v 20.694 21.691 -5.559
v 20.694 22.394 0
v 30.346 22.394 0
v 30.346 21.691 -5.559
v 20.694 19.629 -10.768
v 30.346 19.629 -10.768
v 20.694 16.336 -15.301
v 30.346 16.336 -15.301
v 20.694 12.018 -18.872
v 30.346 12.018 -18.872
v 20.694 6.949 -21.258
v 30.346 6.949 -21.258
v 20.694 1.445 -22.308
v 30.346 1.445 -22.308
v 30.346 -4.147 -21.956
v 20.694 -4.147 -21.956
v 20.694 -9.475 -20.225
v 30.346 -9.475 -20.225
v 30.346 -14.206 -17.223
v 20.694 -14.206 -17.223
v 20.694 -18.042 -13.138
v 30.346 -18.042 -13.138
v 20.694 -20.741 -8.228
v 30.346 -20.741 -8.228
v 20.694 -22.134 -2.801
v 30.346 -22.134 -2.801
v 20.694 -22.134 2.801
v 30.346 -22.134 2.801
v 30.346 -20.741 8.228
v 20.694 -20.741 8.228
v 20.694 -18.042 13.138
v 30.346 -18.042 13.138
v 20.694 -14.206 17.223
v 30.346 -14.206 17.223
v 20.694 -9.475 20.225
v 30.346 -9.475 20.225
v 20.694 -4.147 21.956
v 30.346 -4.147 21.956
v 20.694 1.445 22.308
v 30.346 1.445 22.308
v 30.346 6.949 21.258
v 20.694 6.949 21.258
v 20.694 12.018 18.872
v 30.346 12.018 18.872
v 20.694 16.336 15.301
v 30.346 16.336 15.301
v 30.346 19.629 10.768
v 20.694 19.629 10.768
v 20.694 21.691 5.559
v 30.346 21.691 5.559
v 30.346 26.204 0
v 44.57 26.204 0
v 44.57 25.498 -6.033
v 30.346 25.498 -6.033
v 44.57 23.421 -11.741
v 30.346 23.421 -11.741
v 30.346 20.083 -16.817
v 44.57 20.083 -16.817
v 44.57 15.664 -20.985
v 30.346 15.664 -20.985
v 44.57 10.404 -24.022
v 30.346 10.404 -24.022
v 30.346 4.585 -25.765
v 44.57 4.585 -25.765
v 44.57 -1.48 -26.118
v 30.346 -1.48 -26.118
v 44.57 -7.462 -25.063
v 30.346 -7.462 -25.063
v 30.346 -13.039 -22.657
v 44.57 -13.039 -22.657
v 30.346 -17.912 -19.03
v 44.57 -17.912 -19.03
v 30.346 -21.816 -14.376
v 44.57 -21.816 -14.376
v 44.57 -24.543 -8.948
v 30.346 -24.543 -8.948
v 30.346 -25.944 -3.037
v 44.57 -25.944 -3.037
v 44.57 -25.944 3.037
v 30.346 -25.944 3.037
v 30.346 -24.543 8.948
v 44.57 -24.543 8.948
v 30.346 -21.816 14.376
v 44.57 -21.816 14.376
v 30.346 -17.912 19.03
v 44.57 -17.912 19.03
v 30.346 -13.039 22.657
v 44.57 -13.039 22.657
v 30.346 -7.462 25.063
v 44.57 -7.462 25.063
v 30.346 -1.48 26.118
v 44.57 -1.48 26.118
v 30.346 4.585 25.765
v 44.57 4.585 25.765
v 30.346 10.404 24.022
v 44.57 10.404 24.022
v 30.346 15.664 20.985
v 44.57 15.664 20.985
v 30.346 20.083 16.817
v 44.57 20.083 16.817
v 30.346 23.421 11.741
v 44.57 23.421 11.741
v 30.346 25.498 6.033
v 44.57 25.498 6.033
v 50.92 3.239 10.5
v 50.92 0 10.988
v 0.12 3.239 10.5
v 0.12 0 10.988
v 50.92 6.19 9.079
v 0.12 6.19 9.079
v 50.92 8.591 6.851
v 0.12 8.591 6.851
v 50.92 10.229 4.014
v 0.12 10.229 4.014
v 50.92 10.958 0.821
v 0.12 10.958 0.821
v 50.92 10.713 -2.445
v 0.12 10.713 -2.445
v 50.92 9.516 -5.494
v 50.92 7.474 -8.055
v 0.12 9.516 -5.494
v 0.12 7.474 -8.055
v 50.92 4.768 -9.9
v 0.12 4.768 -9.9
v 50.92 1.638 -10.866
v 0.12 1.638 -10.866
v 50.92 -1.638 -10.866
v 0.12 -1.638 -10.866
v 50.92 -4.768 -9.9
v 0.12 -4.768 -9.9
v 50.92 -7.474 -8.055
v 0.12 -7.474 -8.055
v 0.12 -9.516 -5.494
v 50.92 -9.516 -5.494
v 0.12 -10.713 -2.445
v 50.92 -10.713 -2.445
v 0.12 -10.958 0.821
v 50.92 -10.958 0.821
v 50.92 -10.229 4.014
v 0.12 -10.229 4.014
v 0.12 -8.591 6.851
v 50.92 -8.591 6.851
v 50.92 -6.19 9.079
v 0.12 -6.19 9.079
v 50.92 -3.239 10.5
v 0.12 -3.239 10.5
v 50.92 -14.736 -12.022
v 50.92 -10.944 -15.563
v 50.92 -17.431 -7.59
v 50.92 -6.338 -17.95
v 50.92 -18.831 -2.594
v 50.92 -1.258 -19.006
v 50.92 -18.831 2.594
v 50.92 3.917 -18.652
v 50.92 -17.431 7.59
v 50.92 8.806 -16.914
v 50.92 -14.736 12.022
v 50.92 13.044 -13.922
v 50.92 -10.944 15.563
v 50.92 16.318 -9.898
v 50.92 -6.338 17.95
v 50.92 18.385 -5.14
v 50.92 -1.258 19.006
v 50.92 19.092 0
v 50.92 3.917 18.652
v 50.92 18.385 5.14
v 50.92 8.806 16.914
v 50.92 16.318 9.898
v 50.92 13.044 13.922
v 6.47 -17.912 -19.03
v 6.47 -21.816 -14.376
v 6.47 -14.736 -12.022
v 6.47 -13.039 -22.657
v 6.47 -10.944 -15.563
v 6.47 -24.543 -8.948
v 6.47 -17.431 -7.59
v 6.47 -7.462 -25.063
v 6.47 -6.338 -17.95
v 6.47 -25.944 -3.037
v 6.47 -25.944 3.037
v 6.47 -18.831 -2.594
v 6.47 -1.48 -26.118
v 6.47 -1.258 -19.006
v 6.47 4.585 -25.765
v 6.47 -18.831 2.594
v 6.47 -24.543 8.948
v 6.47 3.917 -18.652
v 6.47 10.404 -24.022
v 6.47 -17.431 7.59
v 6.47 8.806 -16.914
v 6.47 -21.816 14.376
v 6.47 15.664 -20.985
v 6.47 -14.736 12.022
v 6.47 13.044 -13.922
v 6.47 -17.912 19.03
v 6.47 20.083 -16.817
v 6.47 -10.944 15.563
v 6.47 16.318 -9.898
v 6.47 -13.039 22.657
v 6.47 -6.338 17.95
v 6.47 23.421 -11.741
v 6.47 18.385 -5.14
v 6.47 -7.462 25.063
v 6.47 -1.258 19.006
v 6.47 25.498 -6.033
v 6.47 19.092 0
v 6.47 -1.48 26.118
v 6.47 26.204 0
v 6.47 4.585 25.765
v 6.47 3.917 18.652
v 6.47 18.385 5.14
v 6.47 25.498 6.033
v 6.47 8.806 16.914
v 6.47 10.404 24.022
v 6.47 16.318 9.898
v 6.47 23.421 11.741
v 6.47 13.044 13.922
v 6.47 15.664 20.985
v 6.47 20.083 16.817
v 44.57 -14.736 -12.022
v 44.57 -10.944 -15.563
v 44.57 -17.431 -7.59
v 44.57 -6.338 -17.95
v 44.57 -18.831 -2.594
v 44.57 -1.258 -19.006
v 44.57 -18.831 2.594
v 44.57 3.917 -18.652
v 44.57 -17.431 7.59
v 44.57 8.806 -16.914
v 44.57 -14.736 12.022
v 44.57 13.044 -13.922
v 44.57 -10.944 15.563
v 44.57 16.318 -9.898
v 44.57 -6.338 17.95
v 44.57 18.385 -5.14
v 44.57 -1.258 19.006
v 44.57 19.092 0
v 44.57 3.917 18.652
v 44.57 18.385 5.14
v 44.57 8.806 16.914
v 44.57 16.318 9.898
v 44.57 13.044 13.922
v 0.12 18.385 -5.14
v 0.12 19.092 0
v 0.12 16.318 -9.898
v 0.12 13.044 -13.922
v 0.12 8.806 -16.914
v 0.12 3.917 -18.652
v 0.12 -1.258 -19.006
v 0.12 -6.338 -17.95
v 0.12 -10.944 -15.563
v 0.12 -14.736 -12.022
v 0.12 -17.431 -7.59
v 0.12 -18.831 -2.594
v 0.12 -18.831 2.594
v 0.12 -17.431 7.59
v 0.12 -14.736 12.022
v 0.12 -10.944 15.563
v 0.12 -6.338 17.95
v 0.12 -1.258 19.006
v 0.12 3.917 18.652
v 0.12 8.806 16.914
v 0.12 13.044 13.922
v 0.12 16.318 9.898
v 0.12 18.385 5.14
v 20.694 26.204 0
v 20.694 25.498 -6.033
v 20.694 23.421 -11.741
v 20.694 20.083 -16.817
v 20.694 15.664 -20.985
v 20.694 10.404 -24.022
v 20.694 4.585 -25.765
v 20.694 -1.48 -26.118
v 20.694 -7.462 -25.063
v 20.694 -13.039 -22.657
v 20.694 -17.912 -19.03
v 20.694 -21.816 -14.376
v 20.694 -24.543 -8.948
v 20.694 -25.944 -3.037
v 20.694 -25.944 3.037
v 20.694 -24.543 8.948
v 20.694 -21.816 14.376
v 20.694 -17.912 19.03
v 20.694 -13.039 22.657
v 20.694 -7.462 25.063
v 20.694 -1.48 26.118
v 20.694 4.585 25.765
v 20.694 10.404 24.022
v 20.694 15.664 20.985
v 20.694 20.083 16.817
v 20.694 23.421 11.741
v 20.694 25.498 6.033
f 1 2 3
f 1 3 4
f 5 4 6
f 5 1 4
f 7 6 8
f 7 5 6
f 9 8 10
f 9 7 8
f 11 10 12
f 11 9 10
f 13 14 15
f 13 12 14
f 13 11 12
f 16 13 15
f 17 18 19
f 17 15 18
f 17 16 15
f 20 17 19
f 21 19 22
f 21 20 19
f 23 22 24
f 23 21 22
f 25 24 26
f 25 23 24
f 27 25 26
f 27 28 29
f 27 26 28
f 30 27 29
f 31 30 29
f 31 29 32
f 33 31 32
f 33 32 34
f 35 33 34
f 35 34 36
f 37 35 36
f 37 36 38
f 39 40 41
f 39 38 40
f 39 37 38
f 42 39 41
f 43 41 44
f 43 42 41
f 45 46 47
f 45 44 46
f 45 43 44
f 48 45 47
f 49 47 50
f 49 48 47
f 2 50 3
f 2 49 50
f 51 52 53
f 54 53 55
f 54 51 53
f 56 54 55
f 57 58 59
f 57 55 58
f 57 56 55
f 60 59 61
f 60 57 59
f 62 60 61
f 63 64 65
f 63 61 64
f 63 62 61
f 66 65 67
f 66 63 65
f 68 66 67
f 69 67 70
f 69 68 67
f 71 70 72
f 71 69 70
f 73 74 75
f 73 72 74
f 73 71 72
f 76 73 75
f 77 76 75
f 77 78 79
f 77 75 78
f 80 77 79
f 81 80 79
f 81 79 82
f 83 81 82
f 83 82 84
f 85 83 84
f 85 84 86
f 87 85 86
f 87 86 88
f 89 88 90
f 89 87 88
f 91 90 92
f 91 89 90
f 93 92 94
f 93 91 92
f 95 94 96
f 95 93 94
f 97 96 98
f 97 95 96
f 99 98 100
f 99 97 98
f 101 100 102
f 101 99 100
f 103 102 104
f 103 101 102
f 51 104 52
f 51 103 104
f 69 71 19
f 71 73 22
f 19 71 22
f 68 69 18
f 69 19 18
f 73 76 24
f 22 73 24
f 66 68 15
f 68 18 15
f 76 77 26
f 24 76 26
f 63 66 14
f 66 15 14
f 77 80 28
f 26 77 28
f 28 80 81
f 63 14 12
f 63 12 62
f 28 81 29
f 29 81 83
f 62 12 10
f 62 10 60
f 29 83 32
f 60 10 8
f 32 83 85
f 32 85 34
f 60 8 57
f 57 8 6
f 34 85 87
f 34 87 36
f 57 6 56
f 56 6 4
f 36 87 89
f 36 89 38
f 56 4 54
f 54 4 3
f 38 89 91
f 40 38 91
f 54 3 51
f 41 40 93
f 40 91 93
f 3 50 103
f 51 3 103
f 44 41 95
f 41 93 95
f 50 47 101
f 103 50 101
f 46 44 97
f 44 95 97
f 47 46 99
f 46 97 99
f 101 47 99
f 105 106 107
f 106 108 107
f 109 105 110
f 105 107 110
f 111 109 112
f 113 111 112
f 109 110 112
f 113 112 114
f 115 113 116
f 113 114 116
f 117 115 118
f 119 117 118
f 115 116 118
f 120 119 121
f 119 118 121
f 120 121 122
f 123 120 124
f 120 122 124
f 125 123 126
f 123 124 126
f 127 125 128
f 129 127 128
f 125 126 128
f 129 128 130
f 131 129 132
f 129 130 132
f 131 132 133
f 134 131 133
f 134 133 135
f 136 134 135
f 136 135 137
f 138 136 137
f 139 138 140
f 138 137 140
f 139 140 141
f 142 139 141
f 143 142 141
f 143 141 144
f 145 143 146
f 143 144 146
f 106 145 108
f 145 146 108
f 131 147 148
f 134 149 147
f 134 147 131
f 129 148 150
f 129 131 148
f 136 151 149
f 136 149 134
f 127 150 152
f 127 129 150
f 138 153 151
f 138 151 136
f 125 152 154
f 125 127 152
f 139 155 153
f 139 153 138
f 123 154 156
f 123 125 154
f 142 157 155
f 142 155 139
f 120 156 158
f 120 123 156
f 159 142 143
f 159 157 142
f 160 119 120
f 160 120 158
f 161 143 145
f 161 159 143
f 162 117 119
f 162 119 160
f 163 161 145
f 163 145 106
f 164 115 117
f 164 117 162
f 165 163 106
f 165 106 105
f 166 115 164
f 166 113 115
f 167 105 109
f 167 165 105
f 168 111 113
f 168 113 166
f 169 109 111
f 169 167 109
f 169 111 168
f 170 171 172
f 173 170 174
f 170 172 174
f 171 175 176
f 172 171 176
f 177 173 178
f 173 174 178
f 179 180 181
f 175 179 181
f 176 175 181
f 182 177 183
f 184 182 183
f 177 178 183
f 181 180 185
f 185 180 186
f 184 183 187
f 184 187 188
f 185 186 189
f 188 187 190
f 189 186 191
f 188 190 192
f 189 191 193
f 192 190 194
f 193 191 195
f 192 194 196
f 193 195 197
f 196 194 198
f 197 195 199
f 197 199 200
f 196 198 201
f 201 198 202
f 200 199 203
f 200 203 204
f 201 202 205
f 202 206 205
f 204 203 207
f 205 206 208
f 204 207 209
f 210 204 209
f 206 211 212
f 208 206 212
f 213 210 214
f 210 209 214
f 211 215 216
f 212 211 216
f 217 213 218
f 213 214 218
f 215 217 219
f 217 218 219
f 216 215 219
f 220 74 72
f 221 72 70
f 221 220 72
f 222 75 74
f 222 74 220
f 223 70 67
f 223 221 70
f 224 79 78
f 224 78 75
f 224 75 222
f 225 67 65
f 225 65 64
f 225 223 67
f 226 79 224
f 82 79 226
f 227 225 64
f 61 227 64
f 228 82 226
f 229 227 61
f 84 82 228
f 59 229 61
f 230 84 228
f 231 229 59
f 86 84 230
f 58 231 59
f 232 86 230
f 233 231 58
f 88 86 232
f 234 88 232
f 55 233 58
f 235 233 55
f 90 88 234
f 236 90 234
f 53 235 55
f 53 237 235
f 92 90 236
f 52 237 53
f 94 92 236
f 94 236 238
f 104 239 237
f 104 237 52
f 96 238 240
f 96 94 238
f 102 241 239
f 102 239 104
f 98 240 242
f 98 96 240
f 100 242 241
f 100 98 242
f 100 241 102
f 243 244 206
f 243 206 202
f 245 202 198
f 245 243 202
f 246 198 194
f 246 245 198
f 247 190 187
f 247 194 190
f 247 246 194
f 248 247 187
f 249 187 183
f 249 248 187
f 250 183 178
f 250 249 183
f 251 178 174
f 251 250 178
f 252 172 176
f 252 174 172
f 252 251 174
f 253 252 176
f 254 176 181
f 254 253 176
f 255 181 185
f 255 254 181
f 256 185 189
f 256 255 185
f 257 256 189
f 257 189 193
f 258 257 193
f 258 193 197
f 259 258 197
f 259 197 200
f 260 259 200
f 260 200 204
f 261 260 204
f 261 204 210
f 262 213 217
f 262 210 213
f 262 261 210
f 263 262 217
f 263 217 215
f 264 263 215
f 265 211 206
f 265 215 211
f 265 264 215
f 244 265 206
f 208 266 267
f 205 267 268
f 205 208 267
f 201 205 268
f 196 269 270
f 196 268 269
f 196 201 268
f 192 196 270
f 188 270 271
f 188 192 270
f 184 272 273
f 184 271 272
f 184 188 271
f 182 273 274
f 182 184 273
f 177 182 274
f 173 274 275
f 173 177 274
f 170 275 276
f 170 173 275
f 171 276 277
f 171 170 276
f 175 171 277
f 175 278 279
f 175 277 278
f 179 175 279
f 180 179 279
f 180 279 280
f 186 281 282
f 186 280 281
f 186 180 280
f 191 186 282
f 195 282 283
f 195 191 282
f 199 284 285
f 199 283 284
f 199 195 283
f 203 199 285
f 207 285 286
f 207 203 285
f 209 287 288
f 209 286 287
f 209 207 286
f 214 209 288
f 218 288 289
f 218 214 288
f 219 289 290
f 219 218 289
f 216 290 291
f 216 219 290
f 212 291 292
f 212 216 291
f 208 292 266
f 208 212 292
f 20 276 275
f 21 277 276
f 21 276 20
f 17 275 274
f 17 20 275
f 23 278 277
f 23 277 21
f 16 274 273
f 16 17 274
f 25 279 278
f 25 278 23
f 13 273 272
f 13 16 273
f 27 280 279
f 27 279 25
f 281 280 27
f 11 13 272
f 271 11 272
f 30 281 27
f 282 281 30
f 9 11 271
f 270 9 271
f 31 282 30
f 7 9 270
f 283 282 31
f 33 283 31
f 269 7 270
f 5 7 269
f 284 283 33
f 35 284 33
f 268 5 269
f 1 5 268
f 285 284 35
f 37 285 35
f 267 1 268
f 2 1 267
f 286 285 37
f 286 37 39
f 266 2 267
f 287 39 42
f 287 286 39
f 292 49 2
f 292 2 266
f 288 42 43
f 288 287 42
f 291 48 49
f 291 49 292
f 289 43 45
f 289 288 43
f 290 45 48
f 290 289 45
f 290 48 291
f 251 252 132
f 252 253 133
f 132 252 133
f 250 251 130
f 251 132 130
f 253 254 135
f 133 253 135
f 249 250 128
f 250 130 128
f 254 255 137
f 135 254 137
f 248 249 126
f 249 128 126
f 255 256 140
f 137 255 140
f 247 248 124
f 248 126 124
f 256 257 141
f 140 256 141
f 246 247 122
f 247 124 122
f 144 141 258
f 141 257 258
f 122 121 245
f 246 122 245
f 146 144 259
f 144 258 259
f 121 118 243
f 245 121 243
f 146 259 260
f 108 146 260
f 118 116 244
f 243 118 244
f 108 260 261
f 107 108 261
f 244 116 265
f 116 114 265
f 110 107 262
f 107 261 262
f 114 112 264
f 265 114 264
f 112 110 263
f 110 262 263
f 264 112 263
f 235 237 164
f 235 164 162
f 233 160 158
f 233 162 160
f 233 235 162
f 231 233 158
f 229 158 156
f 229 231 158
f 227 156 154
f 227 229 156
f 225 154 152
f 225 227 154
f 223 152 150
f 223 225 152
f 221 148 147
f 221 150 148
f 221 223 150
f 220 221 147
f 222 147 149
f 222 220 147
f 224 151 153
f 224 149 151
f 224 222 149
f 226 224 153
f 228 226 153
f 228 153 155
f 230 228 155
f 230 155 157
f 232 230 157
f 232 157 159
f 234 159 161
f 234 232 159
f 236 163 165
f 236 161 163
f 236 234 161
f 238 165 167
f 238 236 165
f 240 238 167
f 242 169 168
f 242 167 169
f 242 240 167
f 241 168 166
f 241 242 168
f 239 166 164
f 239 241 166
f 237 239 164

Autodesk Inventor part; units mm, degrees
ref_plane "YZ Plane" through (0, 0, 0) normal (1, 0, 0) x (0, 1, 0)
ref_plane "XZ Plane" through (0, 0, 0) normal (0, 1, 0) x (-1, 0, 0)
ref_plane "XY Plane" through (0, 0, 0) normal (0, 0, 1) x (1, 0, 0)
sketch "Boceto1" plane through (0, 0, 0) normal (0, 0, 1) x (1, 0, 0)
  line L0 (0.1195, 0.0416) -> (6.4695, 0.0416)
  line L1 (6.4695, 0.0416) -> (6.4695, 19.0916)
  line L2 (6.4695, 19.0916) -> (0.1195, 19.0916)
  line L3 (0.1195, 19.0916) -> (0.1195, 0.0416)
  line L4 (6.4695, 0.0416) -> (20.6935, 0.0416)
  line L5 (20.6935, 0.0416) -> (20.6935, 26.2036)
  line L6 (20.6935, 26.2036) -> (6.4695, 26.2036)
  line L7 (6.4695, 26.2036) -> (6.4695, 0.0416)
  line L8 (20.6935, 0.0416) -> (30.3455, 0.0416)
  line L9 (30.3455, 0.0416) -> (30.3455, 22.3936)
  line L10 (30.3455, 22.3936) -> (20.6935, 22.3936)
  line L11 (20.6935, 22.3936) -> (20.6935, 0.0416)
  line L12 (30.3455, 0.0416) -> (44.5695, 0.0416)
  line L13 (44.5695, 0.0416) -> (44.5695, 26.2036)
  line L14 (44.5695, 26.2036) -> (30.3455, 26.2036)
  line L15 (30.3455, 26.2036) -> (30.3455, 0.0416)
  line L16 (44.5695, 0.0416) -> (50.9195, 0.0416)
  line L17 (50.9195, 0.0416) -> (50.9195, 19.0916)
  line L18 (50.9195, 19.0916) -> (44.5695, 19.0916)
  line L19 (44.5695, 19.0916) -> (44.5695, 0.0416)
  line L20 (0.1195, 0.0416) -> (50.9195, 0.0416)
  dimension "d2" = 19.05
  dimension "d3" = 26.162
  dimension "d4" = 9.652
  dimension "d5" = 50.8
  dimension "d6" = 14.224
  dimension "d7" = 6.35
  dimension "d8" = 3.81
revolve "Revolución1" add sketch "Boceto1" angle 360 about axis through (0.1195, 0.0416, 0) along (1, 0, 0)
sketch "Boceto2" plane through (0.1195, 0.0416, 0) normal (-1, 0, 0) x (0, 0, 1)
  circle A0 centre (0, -0.0416) radius 10.9883
extrude "Extrusión1" cut sketch "Boceto2" against normal blind 50.8
equation "\"d2\" = 0.5 * DistC"
equation "\"d3\" = 0.5 * DistA"
equation "\"d4\" = DistE"
equation "\"d5\" = DistB"
equation "\"d6\" = DistX"
equation "\"d7\" = DistD - DistX"
equation "\"d10\" = DistB"
equation "\"DistA\" = 52.324"
equation "\"DistB\" = 50.8"
equation "\"DistC\" = 38.1"
equation "\"DistD\" = 20.574"
equation "\"DistE\" = 9.652"
equation "\"DistX\" = 14.224"
properties part number "Pieza2-Tarea2"
